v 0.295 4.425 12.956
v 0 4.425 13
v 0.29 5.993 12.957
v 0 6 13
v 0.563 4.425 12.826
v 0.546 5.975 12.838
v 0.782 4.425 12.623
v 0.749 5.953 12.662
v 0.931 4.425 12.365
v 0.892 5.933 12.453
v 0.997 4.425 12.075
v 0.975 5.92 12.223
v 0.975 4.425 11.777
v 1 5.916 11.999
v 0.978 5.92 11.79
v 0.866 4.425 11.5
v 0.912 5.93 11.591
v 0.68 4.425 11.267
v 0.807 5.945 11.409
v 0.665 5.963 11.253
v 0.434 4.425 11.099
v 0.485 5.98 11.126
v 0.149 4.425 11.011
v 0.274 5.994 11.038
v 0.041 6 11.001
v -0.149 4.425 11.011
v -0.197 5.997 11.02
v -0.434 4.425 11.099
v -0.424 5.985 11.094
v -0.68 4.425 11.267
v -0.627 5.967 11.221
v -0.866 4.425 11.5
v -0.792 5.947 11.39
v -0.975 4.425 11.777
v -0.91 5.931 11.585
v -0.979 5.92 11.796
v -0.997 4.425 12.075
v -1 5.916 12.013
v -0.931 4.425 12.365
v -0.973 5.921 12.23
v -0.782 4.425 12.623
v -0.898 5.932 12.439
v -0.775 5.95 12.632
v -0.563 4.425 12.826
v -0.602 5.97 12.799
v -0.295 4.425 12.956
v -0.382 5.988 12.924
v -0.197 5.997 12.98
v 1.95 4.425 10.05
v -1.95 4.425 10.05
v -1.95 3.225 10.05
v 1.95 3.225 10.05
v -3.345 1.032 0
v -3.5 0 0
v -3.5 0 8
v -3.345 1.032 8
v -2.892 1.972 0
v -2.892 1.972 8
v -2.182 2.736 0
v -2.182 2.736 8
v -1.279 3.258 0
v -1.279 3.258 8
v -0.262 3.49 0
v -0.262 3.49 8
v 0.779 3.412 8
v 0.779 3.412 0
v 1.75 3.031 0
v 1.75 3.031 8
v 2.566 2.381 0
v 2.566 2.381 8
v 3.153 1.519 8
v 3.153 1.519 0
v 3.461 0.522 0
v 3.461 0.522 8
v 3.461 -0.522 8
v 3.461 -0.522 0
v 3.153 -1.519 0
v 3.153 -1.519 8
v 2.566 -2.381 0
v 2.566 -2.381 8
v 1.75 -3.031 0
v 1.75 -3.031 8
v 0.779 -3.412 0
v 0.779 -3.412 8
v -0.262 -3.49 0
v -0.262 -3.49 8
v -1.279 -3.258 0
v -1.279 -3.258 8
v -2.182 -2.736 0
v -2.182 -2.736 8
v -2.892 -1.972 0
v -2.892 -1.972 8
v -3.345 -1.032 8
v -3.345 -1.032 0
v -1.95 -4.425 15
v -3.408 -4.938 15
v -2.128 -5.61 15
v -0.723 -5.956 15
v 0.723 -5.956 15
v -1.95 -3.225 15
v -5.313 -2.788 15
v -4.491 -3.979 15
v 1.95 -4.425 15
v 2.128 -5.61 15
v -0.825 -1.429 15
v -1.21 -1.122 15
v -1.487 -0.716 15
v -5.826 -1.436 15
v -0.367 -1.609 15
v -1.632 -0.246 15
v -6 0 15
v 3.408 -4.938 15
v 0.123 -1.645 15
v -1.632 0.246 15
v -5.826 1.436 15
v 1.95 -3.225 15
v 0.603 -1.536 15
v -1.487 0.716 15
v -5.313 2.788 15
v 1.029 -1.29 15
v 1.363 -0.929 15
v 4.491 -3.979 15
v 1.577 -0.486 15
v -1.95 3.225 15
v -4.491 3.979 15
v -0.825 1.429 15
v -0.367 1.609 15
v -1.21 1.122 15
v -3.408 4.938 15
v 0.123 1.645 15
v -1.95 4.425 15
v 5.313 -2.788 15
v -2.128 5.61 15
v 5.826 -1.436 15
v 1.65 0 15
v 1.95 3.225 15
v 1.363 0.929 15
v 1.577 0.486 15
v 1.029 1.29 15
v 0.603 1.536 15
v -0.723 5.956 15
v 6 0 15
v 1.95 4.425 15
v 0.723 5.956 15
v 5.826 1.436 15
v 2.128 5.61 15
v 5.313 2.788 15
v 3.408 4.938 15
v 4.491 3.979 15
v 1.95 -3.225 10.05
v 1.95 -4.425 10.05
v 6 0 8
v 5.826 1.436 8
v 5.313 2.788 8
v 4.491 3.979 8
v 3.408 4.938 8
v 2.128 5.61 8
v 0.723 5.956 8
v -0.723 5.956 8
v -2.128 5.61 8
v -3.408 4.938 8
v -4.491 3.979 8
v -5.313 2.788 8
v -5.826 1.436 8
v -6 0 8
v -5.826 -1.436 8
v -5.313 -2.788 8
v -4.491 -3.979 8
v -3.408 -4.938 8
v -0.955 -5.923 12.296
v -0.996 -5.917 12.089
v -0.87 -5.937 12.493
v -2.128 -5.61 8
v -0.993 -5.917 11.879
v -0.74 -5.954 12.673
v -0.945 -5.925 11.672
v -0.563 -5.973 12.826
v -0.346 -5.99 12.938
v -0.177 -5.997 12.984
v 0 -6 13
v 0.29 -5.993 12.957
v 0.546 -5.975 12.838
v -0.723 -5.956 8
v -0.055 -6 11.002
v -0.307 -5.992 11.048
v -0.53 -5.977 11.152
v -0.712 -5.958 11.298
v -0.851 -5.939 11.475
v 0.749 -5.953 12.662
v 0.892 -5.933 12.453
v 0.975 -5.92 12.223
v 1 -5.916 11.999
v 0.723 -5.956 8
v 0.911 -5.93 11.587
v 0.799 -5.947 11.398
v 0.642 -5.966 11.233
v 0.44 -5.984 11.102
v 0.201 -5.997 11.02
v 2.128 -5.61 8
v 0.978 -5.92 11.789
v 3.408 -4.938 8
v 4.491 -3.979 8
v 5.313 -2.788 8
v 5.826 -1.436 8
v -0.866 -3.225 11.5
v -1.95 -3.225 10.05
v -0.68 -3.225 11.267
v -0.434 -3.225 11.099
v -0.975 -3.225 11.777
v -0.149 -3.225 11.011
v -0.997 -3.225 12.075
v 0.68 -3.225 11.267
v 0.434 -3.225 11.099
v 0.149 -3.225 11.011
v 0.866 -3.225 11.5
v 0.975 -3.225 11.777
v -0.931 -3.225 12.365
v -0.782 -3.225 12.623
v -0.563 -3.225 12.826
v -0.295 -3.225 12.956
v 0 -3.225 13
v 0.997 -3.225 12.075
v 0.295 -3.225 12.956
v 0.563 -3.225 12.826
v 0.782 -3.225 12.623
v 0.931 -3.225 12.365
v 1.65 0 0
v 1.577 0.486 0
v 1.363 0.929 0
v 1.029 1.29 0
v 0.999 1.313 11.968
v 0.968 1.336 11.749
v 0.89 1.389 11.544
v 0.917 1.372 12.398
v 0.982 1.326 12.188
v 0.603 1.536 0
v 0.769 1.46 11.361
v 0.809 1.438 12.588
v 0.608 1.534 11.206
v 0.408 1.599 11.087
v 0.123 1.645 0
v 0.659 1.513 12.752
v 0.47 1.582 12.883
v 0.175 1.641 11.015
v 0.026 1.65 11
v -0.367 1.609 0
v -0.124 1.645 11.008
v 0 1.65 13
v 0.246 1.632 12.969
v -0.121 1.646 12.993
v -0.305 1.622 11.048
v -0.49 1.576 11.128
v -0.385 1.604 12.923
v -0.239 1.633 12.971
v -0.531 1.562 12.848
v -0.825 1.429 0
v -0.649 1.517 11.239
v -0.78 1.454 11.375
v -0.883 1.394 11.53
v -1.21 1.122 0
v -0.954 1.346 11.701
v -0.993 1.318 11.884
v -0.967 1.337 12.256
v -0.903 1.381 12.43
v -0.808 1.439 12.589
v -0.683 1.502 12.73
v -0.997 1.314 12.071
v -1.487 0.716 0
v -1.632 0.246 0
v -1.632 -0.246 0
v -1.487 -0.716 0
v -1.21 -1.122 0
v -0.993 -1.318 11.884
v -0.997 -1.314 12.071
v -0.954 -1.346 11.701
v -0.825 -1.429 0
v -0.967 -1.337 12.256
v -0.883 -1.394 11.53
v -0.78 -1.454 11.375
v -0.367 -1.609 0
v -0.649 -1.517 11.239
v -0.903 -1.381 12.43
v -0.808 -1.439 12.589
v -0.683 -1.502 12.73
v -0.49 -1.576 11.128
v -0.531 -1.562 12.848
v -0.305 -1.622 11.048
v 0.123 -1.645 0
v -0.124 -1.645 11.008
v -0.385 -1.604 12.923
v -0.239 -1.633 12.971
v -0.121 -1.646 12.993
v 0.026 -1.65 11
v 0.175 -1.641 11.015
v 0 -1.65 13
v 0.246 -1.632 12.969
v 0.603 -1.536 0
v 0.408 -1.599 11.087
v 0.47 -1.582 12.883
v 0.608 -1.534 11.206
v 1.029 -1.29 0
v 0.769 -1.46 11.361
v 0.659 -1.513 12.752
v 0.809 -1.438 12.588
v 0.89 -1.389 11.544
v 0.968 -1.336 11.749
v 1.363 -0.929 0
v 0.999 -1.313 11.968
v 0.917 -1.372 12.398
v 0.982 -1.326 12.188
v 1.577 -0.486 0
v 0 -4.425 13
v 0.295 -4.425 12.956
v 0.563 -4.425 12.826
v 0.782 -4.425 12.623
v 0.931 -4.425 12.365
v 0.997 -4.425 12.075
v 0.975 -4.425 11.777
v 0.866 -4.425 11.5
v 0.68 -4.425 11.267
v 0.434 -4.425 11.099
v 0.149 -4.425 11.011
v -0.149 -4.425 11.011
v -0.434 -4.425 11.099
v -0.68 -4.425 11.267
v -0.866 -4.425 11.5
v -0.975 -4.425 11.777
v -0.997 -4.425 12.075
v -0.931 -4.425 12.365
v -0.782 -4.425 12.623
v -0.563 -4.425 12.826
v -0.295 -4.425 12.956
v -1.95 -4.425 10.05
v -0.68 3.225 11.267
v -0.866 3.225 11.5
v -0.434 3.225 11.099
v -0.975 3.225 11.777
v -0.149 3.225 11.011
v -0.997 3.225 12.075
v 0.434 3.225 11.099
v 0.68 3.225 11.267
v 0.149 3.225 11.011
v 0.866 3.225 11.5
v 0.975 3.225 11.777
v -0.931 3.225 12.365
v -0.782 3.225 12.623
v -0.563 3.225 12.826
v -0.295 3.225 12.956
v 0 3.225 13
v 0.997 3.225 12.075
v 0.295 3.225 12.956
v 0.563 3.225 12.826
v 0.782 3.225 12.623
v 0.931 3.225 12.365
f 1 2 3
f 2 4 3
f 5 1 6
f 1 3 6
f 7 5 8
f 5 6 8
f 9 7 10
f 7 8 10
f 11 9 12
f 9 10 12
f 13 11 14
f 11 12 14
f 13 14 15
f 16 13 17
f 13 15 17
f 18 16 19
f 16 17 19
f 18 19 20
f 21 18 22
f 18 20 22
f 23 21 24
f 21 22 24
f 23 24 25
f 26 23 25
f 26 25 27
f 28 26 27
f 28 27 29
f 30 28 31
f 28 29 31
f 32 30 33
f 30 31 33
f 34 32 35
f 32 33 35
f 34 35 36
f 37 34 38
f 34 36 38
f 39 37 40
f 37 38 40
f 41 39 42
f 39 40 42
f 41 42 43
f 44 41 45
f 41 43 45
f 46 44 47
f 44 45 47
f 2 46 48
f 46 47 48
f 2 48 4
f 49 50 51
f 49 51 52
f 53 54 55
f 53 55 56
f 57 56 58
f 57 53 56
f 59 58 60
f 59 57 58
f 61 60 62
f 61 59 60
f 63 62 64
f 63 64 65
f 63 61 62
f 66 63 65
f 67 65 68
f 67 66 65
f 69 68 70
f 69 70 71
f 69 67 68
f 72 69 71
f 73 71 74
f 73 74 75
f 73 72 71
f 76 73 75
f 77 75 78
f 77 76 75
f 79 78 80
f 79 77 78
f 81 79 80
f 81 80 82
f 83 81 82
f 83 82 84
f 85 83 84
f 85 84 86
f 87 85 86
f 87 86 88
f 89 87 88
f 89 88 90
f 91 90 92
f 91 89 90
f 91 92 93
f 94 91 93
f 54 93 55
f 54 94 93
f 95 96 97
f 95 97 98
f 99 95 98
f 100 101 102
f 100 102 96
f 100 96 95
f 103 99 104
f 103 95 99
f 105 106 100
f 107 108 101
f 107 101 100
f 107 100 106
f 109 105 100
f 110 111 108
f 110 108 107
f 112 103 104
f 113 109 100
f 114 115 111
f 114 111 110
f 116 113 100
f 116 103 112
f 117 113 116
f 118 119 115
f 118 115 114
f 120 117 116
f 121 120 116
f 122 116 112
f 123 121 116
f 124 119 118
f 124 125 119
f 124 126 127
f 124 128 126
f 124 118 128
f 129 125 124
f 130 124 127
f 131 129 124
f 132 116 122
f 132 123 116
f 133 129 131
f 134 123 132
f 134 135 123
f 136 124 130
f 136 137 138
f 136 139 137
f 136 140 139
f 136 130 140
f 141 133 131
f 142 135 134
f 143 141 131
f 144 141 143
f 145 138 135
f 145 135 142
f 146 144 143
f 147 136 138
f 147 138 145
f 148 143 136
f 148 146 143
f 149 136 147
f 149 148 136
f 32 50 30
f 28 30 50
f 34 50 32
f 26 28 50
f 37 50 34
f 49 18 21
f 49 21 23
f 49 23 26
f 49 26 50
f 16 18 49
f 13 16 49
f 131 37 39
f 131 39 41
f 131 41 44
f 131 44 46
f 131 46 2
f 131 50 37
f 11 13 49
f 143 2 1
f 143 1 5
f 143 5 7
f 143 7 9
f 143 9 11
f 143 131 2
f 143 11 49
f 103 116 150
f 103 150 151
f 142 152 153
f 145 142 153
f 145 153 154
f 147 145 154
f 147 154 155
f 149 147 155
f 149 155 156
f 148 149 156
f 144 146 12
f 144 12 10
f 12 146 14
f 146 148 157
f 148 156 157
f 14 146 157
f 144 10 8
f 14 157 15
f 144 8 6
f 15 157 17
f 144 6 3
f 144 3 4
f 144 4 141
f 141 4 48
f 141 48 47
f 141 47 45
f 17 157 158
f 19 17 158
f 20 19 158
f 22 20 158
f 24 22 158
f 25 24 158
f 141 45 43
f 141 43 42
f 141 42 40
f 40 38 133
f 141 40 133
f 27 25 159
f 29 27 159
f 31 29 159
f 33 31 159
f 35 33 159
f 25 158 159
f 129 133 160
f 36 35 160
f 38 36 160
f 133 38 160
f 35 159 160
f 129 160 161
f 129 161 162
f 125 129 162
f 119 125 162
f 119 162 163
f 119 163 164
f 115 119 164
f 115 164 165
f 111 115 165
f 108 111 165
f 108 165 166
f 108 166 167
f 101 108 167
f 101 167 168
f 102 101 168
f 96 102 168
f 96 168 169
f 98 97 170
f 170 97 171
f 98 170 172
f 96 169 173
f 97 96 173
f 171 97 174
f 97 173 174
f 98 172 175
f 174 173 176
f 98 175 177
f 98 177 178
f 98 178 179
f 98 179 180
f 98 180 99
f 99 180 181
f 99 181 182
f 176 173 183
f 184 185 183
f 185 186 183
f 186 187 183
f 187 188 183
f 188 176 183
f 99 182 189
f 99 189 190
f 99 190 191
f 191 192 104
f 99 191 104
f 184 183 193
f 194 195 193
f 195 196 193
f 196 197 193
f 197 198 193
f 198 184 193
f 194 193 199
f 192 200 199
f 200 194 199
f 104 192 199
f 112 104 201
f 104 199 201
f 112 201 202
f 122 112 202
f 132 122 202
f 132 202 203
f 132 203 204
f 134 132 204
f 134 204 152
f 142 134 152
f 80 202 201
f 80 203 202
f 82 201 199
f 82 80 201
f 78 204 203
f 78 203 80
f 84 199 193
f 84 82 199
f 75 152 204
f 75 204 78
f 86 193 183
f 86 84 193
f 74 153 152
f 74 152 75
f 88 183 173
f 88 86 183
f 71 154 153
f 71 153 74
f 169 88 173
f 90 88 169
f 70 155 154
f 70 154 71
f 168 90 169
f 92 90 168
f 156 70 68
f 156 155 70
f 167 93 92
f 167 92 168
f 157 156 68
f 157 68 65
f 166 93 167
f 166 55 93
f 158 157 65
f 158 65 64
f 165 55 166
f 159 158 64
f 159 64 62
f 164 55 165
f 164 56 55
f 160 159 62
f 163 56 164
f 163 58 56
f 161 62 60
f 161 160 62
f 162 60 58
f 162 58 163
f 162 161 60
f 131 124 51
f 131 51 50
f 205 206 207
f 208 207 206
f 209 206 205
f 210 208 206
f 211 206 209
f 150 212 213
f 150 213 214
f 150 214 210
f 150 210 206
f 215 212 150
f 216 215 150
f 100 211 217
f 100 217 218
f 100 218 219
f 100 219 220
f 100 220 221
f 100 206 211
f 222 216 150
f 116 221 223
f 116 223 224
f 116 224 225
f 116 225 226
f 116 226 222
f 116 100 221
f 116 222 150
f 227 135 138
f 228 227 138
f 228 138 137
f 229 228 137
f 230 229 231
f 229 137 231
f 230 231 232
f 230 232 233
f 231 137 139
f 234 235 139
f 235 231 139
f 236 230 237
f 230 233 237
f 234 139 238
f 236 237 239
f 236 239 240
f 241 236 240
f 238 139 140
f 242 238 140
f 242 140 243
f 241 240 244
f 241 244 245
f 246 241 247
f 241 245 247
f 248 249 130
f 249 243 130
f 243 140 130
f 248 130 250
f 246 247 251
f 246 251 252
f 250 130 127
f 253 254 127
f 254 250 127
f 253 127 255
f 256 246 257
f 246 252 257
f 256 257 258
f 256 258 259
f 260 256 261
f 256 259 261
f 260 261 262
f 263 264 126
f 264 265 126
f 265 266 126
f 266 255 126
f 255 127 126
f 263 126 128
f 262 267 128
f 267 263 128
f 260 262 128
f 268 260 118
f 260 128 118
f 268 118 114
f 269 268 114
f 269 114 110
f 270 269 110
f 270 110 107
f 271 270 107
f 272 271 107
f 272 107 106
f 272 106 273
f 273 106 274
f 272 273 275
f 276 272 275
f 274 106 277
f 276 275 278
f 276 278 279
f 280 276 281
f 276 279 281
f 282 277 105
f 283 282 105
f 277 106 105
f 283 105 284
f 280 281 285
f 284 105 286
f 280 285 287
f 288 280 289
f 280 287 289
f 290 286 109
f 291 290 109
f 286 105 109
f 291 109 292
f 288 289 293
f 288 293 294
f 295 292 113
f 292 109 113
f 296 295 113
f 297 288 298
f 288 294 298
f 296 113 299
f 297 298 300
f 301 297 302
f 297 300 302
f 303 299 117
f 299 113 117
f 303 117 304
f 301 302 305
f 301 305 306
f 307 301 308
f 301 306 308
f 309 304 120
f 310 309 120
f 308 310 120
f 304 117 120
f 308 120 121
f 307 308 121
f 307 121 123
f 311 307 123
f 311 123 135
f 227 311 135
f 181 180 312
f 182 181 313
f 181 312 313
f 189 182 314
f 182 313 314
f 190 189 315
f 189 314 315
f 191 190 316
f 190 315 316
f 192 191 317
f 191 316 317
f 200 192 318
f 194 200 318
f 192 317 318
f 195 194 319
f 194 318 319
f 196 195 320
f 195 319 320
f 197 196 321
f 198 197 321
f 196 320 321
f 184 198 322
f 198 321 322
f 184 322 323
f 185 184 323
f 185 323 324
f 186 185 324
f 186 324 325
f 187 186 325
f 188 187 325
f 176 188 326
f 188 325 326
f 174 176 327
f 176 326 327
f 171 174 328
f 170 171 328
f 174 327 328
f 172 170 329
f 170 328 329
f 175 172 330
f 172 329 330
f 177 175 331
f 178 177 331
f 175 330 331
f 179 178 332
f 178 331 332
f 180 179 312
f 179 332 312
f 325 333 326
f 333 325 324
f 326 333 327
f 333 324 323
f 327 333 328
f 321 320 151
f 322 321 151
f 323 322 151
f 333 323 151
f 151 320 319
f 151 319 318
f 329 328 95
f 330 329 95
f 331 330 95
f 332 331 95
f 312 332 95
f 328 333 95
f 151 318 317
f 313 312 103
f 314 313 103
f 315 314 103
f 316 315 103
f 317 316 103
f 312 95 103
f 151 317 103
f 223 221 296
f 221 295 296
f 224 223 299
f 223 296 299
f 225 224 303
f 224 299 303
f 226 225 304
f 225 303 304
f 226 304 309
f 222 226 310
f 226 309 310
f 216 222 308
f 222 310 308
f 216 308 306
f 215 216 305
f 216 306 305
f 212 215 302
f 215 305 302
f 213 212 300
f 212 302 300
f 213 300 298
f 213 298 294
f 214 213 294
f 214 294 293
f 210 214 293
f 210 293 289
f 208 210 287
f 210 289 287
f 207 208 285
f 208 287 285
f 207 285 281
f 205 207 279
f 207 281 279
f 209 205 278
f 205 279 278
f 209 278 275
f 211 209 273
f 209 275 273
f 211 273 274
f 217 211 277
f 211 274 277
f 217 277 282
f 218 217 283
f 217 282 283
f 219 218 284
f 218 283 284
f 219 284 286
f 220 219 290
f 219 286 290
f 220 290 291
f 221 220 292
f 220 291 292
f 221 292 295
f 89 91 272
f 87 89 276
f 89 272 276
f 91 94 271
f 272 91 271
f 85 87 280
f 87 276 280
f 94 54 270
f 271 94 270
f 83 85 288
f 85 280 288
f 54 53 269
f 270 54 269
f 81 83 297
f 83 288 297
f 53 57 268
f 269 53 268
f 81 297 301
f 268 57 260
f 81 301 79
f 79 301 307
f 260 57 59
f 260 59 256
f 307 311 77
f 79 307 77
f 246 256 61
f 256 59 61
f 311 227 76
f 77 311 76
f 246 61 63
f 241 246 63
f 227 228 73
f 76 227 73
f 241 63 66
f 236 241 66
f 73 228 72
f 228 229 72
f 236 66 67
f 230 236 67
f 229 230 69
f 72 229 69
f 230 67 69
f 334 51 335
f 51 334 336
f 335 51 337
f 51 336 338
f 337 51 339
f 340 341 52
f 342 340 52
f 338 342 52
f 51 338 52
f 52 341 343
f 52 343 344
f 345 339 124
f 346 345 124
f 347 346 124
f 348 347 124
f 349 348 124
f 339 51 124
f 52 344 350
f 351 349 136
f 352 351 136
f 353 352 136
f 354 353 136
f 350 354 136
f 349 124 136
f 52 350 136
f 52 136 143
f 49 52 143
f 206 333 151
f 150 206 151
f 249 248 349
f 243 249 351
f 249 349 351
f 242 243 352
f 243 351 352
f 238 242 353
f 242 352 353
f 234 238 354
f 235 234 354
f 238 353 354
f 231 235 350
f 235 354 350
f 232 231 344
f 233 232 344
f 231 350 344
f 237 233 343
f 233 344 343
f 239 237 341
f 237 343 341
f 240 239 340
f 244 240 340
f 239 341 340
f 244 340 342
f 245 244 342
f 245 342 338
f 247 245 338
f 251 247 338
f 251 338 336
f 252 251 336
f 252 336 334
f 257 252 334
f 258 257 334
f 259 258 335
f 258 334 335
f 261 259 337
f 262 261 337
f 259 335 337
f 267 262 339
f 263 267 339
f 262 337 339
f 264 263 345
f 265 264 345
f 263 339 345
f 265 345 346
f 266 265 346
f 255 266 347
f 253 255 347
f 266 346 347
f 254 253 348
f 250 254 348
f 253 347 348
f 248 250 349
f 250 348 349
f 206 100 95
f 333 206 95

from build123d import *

# Parameters (mm, degrees)
SKETCH1_R           = 6
BOSS_EXTRUDE1_DEPTH = 15
SKETCH2_R           = 1.65
CUT_EXTRUDE1_DEPTH  = 18.23368794
SKETCH13_W          = 3.9
SKETCH13_H          = 1.2
CUT_EXTRUDE6_DEPTH  = 4.95
SKETCH4_R           = 1
CUT_EXTRUDE7_DEPTH  = 7.5
SKETCH19_R          = 6
SKETCH19_R_2        = 5.5
SKETCH19_R_3        = 3.5
CUT_EXTRUDE12_DEPTH = 8


with BuildPart() as part:
    # Sketch1 → Boss-Extrude1 (new body)
    with BuildSketch(Plane.XY):
        Circle(SKETCH1_R)
    extrude(amount=BOSS_EXTRUDE1_DEPTH)

    # Sketch2 → Cut-Extrude1 (cut, through all)
    with BuildSketch(Plane.XY.offset(15)):
        Circle(SKETCH2_R)
    extrude(amount=-CUT_EXTRUDE1_DEPTH, mode=Mode.SUBTRACT)

    # Sketch13 → Cut-Extrude6 (cut)
    with BuildSketch(Plane.XY.offset(15)):
        with Locations((0, 3.825)):
            Rectangle(SKETCH13_W, SKETCH13_H)
    cut_extrude6 = extrude(amount=-CUT_EXTRUDE6_DEPTH, mode=Mode.SUBTRACT)

    # Sketch4 → Cut-Extrude7 (cut, symmetric)
    with BuildSketch(Plane(origin=(0, 0, 0), x_dir=(1, 0, 0), z_dir=(0, 1, 0))):
        with Locations(Location((0, -12, 0), (0, 0, 270))):
            Circle(SKETCH4_R)
    extrude(amount=CUT_EXTRUDE7_DEPTH, both=True, mode=Mode.SUBTRACT)

    # Mirror1: Cut-Extrude6 across plane
    add(cut_extrude6.mirror(Plane.ZX), mode=Mode.SUBTRACT)

    # Sketch19 → Cut-Extrude12 (cut)
    # profile 1 of 2: a face of its own
    with BuildSketch(Plane(origin=(0, 0, 0), x_dir=(-1, 0, 0), z_dir=(0, 0, -1))):
        Circle(SKETCH19_R)
        Circle(SKETCH19_R_2, mode=Mode.SUBTRACT)
    # profile 2 of 2: a face of its own
    with BuildSketch(Plane(origin=(0, 0, 0), x_dir=(-1, 0, 0), z_dir=(0, 0, -1))):
        Circle(SKETCH19_R_2)
        Circle(SKETCH19_R_3, mode=Mode.SUBTRACT)
    extrude(amount=-CUT_EXTRUDE12_DEPTH, mode=Mode.SUBTRACT)


solid = part.part
